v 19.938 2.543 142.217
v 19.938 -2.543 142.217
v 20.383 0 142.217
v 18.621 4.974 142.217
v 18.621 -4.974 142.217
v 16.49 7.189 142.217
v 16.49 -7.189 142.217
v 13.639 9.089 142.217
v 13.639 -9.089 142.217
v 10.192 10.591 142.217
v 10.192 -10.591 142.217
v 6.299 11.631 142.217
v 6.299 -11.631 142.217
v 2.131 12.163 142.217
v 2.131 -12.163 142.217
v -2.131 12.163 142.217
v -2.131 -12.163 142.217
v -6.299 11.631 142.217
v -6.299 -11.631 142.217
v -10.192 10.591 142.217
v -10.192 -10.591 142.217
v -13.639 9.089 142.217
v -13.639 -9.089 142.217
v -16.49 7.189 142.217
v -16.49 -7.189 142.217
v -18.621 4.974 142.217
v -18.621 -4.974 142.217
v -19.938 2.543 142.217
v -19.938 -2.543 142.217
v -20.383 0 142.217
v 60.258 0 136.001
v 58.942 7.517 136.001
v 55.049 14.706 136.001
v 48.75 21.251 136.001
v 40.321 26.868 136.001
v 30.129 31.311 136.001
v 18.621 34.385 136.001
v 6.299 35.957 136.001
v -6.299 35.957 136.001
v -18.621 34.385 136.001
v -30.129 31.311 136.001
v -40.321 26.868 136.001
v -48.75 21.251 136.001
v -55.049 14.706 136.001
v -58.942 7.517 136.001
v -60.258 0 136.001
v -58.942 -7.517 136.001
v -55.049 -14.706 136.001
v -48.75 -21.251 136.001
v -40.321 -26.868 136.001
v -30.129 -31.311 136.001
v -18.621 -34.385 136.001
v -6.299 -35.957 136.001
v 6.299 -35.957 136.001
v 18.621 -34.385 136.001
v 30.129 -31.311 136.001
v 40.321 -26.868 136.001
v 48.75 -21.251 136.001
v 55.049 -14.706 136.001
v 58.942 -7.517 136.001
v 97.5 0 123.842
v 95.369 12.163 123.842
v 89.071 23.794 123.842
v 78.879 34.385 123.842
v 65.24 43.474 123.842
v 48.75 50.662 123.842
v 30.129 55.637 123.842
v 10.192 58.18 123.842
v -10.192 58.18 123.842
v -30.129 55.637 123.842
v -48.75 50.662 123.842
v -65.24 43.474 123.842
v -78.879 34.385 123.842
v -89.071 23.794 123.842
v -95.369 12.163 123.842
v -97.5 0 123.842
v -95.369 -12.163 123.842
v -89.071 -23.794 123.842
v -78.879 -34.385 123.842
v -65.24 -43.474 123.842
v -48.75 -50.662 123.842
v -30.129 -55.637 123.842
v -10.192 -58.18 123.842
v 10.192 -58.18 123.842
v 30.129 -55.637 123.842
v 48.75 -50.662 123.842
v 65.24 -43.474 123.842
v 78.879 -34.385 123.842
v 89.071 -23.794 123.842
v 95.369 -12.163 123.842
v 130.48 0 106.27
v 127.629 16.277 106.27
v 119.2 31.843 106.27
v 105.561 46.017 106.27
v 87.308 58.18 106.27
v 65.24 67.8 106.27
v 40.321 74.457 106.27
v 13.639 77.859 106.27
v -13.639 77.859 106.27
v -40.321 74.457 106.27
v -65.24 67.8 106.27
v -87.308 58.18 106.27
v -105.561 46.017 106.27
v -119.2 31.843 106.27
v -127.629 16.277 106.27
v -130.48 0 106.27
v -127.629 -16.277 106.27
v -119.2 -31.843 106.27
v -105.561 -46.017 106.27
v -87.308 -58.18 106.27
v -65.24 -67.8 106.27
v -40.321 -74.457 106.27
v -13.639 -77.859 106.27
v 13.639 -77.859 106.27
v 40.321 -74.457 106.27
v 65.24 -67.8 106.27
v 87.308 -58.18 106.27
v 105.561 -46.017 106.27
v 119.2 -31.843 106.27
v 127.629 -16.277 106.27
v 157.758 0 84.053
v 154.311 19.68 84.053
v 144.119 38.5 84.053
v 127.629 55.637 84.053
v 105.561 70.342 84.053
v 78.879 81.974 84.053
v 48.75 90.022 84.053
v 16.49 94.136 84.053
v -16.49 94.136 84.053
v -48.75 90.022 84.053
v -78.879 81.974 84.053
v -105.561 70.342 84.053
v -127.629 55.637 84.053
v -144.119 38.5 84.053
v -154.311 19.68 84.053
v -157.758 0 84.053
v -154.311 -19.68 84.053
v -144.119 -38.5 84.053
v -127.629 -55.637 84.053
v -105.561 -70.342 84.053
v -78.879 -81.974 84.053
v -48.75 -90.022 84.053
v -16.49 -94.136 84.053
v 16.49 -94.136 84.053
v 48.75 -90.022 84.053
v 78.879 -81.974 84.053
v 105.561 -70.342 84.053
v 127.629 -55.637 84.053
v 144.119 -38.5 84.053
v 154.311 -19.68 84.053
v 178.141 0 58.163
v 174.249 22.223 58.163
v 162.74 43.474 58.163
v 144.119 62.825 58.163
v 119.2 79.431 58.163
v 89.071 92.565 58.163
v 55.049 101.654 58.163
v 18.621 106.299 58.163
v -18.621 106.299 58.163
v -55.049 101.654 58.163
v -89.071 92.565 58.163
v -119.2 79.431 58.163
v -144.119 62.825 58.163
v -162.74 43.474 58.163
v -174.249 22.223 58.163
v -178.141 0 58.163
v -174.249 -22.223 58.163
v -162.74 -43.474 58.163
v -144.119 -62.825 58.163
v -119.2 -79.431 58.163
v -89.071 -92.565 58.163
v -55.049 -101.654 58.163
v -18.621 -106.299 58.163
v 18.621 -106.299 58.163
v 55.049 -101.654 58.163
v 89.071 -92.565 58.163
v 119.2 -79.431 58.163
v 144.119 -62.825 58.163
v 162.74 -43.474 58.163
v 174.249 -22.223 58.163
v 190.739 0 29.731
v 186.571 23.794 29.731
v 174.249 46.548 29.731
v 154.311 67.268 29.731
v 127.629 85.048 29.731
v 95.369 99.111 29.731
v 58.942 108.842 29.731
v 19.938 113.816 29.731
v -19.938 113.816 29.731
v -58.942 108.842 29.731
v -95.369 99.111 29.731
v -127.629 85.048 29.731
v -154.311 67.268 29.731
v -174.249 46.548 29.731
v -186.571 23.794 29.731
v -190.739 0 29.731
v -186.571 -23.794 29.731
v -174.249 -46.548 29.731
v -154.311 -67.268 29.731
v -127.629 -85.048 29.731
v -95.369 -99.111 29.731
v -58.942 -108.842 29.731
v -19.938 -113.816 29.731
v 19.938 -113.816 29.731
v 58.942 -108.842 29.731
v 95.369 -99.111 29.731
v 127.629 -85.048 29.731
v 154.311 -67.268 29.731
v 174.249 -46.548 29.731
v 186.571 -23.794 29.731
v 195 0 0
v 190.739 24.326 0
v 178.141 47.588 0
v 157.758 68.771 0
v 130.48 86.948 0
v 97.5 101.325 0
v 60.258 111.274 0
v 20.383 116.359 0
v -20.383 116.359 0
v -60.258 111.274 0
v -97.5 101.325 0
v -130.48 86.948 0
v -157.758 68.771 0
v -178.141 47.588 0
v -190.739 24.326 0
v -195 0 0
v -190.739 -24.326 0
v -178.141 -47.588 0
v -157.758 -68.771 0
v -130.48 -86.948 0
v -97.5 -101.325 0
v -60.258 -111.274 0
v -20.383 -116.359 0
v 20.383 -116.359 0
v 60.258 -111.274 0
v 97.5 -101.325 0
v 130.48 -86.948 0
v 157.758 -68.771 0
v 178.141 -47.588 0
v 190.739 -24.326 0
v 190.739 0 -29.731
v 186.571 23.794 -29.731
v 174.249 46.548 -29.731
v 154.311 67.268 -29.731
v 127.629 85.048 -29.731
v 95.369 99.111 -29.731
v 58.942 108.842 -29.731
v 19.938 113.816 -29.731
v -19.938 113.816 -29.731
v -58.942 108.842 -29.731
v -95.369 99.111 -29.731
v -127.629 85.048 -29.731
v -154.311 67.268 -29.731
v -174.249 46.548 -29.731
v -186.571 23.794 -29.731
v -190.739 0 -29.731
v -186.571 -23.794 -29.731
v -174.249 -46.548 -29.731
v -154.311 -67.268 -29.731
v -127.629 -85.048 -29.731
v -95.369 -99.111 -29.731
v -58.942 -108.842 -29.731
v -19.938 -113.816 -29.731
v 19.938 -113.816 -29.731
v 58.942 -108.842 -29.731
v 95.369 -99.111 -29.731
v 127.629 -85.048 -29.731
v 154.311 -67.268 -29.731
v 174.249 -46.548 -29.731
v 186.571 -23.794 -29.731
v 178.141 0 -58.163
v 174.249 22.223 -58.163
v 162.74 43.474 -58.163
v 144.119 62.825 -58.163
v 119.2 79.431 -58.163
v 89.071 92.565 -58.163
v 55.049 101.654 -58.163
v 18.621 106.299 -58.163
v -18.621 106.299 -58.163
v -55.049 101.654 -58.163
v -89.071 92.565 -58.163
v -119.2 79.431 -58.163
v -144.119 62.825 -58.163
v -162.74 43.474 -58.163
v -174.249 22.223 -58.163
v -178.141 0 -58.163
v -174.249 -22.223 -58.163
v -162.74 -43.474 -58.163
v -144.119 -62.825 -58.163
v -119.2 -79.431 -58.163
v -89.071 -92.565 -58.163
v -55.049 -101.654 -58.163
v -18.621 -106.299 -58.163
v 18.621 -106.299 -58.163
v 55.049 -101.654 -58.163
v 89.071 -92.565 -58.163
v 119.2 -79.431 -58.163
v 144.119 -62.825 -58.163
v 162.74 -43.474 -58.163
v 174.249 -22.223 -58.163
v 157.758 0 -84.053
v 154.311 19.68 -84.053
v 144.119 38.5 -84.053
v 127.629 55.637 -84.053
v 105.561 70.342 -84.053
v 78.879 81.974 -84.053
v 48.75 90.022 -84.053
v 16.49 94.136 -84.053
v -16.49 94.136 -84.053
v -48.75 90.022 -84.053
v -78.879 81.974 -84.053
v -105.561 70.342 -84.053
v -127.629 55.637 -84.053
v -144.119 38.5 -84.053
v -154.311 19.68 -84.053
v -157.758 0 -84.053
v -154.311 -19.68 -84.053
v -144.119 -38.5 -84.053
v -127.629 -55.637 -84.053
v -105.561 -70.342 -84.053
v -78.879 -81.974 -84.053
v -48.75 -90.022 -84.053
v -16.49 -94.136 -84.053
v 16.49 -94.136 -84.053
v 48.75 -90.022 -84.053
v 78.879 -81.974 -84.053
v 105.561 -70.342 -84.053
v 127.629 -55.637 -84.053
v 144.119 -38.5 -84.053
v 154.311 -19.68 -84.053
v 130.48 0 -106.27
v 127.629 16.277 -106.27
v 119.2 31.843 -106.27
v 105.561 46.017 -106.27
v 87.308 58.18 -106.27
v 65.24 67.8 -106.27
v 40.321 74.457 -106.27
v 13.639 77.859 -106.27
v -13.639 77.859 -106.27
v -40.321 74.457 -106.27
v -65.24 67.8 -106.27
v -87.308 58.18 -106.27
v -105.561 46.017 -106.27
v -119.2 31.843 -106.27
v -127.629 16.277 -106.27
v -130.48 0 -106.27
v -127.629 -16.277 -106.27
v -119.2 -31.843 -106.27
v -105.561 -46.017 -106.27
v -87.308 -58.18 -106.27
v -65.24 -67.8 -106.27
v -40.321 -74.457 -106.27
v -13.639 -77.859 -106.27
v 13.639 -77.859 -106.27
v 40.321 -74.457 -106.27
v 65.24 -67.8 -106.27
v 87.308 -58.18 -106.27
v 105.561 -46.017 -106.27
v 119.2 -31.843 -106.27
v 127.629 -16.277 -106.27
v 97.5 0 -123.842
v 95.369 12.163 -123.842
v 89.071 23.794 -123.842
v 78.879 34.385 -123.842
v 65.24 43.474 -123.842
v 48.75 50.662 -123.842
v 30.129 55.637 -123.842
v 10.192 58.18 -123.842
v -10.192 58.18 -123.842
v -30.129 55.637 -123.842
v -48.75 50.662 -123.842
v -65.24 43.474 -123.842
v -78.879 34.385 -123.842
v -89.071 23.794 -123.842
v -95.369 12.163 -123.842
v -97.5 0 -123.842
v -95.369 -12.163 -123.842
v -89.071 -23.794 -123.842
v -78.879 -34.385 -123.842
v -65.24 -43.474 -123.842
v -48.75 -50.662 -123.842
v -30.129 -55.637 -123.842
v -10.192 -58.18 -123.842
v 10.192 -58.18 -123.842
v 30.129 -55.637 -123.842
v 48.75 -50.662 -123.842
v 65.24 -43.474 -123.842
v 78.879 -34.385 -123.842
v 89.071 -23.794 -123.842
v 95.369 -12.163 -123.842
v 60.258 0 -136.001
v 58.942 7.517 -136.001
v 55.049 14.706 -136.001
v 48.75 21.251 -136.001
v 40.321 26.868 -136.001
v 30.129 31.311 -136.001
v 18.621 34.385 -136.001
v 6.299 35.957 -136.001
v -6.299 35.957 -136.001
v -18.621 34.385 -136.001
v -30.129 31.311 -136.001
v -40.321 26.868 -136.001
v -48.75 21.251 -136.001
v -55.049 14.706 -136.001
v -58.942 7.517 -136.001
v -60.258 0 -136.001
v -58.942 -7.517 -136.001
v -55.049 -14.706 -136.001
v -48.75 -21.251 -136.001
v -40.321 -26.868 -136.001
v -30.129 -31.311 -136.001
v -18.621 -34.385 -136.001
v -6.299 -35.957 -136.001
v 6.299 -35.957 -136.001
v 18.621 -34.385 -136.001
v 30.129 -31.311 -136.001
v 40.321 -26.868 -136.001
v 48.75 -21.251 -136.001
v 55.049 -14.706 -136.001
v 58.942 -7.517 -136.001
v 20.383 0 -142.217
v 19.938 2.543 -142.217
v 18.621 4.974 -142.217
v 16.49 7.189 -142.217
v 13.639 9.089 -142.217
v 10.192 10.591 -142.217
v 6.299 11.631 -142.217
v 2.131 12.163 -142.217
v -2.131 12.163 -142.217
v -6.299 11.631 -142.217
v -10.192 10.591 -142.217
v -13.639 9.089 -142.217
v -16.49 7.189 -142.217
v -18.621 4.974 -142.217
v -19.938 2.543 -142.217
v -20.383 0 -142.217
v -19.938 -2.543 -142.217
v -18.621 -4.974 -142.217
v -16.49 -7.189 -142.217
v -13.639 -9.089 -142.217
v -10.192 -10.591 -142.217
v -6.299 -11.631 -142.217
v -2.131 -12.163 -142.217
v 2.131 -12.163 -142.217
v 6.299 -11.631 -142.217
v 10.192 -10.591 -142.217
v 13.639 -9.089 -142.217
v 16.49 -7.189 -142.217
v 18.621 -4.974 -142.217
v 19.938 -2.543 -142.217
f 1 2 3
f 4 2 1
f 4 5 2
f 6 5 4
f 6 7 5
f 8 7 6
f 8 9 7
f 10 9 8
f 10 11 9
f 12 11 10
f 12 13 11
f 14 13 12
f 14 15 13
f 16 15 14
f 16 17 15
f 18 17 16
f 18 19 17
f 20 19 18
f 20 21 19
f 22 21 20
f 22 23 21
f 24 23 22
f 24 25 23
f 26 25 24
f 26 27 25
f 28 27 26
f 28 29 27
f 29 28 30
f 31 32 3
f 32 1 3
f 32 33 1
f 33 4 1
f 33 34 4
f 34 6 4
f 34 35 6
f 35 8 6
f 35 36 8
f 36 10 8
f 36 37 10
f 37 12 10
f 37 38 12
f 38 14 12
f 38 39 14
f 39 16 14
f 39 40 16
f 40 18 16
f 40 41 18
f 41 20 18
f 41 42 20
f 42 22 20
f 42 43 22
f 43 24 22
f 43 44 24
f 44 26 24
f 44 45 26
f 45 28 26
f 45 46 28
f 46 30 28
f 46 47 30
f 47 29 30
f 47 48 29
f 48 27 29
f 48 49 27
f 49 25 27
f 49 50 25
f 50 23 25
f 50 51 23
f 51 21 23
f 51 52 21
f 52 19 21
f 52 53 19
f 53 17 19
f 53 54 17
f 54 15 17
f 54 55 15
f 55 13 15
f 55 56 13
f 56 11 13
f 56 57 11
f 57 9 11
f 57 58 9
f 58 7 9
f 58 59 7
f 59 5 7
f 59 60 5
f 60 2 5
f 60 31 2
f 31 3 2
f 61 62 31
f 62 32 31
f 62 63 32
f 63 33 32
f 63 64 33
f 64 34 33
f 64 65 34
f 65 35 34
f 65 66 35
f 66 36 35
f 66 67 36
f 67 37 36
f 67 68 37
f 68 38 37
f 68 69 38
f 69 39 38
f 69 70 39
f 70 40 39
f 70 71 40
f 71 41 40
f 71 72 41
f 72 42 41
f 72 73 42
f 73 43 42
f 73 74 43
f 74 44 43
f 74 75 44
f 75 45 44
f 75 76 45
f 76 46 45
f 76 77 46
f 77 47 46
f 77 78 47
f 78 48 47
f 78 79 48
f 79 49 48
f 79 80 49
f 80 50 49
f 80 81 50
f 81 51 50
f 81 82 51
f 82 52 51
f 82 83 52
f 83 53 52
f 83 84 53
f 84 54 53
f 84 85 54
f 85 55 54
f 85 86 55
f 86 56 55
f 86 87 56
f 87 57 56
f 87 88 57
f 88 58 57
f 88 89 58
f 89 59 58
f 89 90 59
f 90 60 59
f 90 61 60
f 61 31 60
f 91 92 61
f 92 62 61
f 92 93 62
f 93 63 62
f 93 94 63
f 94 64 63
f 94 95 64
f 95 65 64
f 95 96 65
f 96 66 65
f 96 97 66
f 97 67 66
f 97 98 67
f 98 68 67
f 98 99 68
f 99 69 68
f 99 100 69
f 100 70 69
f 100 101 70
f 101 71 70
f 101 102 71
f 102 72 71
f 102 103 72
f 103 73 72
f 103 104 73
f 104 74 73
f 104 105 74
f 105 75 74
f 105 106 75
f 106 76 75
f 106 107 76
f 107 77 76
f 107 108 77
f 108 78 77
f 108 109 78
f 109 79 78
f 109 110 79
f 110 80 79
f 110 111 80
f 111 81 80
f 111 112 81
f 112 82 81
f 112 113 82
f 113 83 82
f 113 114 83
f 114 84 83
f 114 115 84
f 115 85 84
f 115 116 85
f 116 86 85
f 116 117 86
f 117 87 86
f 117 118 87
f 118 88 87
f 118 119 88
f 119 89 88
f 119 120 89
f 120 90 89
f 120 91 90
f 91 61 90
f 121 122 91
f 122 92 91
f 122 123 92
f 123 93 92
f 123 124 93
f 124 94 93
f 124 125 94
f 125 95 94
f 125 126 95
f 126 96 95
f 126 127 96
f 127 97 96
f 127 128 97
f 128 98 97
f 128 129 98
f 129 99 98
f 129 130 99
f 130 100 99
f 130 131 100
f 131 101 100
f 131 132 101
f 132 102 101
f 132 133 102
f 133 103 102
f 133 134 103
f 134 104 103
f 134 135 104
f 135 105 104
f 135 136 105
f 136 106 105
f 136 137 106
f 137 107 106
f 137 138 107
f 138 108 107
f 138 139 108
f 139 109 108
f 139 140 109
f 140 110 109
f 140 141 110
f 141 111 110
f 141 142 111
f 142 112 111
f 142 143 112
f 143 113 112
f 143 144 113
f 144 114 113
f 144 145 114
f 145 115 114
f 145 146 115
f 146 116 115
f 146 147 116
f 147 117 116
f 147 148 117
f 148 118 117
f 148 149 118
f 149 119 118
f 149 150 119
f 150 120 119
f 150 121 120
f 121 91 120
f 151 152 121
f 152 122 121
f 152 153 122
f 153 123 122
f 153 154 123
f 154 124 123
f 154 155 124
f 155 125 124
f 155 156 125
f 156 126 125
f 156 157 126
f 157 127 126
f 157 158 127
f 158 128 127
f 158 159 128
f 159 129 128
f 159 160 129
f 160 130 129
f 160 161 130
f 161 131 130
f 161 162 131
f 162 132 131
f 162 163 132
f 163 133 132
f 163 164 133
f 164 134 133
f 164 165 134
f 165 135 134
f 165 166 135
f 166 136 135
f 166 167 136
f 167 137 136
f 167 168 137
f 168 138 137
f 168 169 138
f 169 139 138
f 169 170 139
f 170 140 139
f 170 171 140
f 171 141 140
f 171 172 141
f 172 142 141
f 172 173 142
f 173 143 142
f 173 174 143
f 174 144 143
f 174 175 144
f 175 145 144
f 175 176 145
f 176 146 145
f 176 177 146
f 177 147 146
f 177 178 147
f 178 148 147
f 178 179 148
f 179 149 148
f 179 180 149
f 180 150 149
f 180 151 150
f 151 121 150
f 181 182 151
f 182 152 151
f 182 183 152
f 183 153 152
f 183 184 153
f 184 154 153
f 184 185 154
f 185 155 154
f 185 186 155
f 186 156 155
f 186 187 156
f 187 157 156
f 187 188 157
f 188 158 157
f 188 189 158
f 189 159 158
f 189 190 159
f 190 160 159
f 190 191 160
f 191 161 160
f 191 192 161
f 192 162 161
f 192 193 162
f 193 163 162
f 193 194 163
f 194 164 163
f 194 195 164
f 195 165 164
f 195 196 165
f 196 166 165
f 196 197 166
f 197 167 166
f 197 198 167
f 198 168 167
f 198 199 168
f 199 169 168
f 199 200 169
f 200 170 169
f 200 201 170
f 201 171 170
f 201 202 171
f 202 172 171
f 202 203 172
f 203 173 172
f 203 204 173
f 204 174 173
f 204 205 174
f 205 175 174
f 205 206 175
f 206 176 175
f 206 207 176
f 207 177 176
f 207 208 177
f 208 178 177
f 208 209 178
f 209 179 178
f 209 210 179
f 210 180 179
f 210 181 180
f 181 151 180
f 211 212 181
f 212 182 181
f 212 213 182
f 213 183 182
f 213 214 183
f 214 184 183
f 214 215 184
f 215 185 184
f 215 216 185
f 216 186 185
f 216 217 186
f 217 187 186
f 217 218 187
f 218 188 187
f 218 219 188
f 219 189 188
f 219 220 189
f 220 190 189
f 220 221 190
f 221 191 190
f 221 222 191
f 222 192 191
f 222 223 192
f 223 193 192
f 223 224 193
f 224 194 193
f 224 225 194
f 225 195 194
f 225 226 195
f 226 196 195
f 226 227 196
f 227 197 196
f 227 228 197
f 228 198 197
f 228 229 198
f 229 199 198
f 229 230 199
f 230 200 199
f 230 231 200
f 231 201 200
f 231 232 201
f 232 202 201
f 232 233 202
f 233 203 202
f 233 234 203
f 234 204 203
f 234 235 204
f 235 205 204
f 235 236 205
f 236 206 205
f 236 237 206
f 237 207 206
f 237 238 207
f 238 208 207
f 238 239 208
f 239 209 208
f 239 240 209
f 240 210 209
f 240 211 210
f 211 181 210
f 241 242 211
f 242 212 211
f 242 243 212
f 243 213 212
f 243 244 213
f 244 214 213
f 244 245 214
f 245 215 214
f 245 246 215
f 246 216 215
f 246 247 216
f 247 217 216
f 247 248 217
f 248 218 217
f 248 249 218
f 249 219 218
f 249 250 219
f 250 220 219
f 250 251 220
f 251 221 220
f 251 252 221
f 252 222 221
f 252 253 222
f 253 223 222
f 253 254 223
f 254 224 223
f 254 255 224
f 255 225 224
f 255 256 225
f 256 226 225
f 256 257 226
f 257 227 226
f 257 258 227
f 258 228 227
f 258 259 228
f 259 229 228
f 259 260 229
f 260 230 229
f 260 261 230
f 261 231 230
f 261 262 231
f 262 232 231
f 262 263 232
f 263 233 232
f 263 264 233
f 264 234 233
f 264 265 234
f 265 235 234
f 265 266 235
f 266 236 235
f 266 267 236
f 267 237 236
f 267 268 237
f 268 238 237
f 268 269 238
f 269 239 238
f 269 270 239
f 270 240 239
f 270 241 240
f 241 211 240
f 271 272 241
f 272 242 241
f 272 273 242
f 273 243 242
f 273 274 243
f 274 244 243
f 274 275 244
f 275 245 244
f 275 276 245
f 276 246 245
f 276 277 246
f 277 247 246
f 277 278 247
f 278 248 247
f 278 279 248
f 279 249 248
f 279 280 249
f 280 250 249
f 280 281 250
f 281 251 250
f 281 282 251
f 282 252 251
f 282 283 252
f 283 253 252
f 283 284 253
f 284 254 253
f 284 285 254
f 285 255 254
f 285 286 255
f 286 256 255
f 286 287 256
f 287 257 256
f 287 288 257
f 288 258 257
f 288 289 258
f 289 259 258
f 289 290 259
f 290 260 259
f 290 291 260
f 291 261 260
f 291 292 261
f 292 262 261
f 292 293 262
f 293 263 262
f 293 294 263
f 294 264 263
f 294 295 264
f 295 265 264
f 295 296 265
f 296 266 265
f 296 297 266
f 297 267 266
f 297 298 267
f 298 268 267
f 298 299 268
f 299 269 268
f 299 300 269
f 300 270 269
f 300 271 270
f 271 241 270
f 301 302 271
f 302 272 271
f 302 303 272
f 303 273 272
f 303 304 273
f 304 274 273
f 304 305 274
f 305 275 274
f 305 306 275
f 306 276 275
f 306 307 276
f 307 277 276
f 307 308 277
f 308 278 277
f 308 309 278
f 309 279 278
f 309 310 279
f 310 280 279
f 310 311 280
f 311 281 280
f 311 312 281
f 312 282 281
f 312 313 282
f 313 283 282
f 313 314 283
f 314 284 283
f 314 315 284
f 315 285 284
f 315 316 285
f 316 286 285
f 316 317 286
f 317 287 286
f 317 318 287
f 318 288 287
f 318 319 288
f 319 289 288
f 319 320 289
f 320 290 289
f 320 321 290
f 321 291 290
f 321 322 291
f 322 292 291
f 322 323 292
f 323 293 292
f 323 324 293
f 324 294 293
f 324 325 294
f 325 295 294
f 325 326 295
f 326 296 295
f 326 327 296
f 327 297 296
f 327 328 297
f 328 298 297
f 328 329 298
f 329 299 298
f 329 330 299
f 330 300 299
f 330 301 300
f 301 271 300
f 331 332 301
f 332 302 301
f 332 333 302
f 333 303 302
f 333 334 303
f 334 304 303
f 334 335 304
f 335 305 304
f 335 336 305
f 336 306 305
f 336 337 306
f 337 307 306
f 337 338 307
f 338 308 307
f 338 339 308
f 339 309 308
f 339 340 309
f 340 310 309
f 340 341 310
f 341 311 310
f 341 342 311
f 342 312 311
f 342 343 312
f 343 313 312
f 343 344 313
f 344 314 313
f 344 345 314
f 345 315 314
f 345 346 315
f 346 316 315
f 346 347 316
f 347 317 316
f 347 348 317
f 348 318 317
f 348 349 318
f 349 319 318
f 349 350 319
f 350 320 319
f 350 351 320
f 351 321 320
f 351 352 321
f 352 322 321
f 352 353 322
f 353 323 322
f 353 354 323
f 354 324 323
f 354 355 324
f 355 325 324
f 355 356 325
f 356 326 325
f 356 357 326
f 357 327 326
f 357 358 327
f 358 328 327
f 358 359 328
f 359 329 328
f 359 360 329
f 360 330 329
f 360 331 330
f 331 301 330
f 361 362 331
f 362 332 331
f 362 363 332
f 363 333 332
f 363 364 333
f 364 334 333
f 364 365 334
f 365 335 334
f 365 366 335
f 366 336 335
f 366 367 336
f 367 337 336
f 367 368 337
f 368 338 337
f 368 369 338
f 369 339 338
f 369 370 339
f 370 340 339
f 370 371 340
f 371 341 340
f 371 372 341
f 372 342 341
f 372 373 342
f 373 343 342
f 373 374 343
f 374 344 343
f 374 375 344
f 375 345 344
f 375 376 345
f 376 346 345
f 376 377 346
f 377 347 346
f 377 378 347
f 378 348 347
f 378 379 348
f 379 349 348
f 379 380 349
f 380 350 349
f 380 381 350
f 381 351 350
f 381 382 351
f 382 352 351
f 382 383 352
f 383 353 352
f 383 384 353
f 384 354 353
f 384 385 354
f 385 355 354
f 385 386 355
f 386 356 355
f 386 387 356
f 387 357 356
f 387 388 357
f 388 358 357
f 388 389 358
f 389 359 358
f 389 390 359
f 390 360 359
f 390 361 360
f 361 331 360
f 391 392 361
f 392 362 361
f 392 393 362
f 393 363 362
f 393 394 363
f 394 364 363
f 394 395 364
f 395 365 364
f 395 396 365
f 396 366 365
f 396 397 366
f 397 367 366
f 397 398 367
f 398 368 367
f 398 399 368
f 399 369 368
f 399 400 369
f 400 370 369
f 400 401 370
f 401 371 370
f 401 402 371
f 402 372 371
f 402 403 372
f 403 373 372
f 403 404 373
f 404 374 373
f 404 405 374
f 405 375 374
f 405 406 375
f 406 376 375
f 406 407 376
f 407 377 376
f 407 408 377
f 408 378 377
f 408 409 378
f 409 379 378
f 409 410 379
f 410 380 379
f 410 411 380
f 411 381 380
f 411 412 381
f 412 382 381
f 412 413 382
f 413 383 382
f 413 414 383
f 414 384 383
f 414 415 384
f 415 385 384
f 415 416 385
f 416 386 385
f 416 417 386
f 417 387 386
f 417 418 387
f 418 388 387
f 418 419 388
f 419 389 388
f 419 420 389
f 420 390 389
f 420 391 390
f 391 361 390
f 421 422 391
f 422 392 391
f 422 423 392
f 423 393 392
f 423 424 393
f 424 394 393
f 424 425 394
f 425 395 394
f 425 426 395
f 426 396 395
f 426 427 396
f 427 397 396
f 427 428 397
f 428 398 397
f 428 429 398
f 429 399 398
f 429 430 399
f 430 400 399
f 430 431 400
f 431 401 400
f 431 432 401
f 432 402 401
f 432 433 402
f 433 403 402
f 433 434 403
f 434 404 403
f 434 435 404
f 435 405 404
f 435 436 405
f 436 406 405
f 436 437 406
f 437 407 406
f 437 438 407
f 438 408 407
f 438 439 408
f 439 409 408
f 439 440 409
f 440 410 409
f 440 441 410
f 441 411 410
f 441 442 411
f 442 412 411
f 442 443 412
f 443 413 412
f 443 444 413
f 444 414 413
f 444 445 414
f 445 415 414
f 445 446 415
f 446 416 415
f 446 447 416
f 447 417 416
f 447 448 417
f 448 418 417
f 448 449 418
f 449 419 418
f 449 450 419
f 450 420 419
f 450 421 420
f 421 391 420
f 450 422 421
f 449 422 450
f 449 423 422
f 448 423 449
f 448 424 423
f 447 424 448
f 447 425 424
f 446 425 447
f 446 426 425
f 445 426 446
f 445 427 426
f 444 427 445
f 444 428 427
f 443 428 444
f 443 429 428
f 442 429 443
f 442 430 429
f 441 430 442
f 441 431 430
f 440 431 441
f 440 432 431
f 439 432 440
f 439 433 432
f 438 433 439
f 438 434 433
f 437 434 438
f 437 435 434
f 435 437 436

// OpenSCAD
// Generated by SolidPython 1.0.1 on 2020-07-29 00:46:52


scale(v = [15, 9, 11]) {
	sphere(r = 13);
}
/***********************************************
*********      SolidPython code:      **********
************************************************
 
# import packages: SolidPython
from solid import *
from solid.utils import *
from itertools import chain, combinations, permutations


class Resize:

    def __init__(self, scad_file):
        self.scad_file = scad_file
        #self.scad_file = import_scad(scad_file)
        # cone/cylinder param:
        self.r1 = 0
        self.r2 = 0
        self.h = 0
        # rectangular prism param:
        self.w = 0
        self.l = 0
        # ellipse param:
        self.r = 0

    # import OpenScad code (file name corresponds to shape)


    # classify shape + parameters
    def assign(self, param1, param2, param3):
        if self.scad_file == 'cone.scad':
            self.r1 = param1
            self.r2 = param2
            self.h = param3
        elif self.scad_file == 'cylinder.scad':
            self.r1 = param1
            self.r2 = param2
            self.h = param3
        elif self.scad_file == 'rectangularPrism.scad':
            self.h = param1
            self.l = param2
            self.w = param3
        else:
            self.r = param1
            self.h = param2

    # resize parameters
    def iterate(self):
        x = range(3, 20, 2)
        i = 1
        if self.scad_file == 'cone.scad':
            tempList = list(permutations(x, 2))
            for temp in tempList:
                param1 = temp[0]
                param2 = temp[1]
                filepath = 'produced_scad_files/' + 'cone' + str(param1) + '_' + str(param2) + '_' + '.scad'
                scad_render_to_file(cylinder(h=param1, r1=param2, r2=0), filepath)

        elif self.scad_file == 'cylinder.scad':
            tempList = list(permutations(x, 3))
            for temp in tempList:
                param1 = temp[0]
                param2 = temp[1]
                filepath = 'produced_scad_files/' + 'cylinder' + str(param1) + '_' + str(param2) + '_' + '.scad'
                scad_render_to_file(cylinder(h=param1, r1=param2, r2=param2), filepath)

        elif self.scad_file == 'rectangularPrism.scad':
            tempList = list(permutations(x, 3))
            for temp in tempList:
                param1 = temp[0]
                param2 = temp[1]
                param3 = temp[2]
                filepath = 'produced_scad_files/' + 'rectangularPrism' + str(param1) + '_' + str(param2) + '_' + str(
                    param3) + '.scad'
                scad_render_to_file(cube(size=(param1, param2, param3)), filepath)

        elif self.scad_file == 'ellipse.scad':
            tempList = list(permutations(x, 4))
            for temp in tempList:
                param1 = temp[0]
                param2 = temp[1]
                param3 = temp[2]
                param4 = temp[3]
                filepath = 'produced_scad_files/' + 'ellipse' + str(param1) + '_' + str(param2) + '_' + str(param3) + '_' + str(param4) + '.scad'
                scad_render_to_file(scale([param1, param2, param3])(sphere(r=param4)), filepath)

    def render_to_scadfile(self):
        scad_render_to_file(scad, 'example.scad') 
 
************************************************/
